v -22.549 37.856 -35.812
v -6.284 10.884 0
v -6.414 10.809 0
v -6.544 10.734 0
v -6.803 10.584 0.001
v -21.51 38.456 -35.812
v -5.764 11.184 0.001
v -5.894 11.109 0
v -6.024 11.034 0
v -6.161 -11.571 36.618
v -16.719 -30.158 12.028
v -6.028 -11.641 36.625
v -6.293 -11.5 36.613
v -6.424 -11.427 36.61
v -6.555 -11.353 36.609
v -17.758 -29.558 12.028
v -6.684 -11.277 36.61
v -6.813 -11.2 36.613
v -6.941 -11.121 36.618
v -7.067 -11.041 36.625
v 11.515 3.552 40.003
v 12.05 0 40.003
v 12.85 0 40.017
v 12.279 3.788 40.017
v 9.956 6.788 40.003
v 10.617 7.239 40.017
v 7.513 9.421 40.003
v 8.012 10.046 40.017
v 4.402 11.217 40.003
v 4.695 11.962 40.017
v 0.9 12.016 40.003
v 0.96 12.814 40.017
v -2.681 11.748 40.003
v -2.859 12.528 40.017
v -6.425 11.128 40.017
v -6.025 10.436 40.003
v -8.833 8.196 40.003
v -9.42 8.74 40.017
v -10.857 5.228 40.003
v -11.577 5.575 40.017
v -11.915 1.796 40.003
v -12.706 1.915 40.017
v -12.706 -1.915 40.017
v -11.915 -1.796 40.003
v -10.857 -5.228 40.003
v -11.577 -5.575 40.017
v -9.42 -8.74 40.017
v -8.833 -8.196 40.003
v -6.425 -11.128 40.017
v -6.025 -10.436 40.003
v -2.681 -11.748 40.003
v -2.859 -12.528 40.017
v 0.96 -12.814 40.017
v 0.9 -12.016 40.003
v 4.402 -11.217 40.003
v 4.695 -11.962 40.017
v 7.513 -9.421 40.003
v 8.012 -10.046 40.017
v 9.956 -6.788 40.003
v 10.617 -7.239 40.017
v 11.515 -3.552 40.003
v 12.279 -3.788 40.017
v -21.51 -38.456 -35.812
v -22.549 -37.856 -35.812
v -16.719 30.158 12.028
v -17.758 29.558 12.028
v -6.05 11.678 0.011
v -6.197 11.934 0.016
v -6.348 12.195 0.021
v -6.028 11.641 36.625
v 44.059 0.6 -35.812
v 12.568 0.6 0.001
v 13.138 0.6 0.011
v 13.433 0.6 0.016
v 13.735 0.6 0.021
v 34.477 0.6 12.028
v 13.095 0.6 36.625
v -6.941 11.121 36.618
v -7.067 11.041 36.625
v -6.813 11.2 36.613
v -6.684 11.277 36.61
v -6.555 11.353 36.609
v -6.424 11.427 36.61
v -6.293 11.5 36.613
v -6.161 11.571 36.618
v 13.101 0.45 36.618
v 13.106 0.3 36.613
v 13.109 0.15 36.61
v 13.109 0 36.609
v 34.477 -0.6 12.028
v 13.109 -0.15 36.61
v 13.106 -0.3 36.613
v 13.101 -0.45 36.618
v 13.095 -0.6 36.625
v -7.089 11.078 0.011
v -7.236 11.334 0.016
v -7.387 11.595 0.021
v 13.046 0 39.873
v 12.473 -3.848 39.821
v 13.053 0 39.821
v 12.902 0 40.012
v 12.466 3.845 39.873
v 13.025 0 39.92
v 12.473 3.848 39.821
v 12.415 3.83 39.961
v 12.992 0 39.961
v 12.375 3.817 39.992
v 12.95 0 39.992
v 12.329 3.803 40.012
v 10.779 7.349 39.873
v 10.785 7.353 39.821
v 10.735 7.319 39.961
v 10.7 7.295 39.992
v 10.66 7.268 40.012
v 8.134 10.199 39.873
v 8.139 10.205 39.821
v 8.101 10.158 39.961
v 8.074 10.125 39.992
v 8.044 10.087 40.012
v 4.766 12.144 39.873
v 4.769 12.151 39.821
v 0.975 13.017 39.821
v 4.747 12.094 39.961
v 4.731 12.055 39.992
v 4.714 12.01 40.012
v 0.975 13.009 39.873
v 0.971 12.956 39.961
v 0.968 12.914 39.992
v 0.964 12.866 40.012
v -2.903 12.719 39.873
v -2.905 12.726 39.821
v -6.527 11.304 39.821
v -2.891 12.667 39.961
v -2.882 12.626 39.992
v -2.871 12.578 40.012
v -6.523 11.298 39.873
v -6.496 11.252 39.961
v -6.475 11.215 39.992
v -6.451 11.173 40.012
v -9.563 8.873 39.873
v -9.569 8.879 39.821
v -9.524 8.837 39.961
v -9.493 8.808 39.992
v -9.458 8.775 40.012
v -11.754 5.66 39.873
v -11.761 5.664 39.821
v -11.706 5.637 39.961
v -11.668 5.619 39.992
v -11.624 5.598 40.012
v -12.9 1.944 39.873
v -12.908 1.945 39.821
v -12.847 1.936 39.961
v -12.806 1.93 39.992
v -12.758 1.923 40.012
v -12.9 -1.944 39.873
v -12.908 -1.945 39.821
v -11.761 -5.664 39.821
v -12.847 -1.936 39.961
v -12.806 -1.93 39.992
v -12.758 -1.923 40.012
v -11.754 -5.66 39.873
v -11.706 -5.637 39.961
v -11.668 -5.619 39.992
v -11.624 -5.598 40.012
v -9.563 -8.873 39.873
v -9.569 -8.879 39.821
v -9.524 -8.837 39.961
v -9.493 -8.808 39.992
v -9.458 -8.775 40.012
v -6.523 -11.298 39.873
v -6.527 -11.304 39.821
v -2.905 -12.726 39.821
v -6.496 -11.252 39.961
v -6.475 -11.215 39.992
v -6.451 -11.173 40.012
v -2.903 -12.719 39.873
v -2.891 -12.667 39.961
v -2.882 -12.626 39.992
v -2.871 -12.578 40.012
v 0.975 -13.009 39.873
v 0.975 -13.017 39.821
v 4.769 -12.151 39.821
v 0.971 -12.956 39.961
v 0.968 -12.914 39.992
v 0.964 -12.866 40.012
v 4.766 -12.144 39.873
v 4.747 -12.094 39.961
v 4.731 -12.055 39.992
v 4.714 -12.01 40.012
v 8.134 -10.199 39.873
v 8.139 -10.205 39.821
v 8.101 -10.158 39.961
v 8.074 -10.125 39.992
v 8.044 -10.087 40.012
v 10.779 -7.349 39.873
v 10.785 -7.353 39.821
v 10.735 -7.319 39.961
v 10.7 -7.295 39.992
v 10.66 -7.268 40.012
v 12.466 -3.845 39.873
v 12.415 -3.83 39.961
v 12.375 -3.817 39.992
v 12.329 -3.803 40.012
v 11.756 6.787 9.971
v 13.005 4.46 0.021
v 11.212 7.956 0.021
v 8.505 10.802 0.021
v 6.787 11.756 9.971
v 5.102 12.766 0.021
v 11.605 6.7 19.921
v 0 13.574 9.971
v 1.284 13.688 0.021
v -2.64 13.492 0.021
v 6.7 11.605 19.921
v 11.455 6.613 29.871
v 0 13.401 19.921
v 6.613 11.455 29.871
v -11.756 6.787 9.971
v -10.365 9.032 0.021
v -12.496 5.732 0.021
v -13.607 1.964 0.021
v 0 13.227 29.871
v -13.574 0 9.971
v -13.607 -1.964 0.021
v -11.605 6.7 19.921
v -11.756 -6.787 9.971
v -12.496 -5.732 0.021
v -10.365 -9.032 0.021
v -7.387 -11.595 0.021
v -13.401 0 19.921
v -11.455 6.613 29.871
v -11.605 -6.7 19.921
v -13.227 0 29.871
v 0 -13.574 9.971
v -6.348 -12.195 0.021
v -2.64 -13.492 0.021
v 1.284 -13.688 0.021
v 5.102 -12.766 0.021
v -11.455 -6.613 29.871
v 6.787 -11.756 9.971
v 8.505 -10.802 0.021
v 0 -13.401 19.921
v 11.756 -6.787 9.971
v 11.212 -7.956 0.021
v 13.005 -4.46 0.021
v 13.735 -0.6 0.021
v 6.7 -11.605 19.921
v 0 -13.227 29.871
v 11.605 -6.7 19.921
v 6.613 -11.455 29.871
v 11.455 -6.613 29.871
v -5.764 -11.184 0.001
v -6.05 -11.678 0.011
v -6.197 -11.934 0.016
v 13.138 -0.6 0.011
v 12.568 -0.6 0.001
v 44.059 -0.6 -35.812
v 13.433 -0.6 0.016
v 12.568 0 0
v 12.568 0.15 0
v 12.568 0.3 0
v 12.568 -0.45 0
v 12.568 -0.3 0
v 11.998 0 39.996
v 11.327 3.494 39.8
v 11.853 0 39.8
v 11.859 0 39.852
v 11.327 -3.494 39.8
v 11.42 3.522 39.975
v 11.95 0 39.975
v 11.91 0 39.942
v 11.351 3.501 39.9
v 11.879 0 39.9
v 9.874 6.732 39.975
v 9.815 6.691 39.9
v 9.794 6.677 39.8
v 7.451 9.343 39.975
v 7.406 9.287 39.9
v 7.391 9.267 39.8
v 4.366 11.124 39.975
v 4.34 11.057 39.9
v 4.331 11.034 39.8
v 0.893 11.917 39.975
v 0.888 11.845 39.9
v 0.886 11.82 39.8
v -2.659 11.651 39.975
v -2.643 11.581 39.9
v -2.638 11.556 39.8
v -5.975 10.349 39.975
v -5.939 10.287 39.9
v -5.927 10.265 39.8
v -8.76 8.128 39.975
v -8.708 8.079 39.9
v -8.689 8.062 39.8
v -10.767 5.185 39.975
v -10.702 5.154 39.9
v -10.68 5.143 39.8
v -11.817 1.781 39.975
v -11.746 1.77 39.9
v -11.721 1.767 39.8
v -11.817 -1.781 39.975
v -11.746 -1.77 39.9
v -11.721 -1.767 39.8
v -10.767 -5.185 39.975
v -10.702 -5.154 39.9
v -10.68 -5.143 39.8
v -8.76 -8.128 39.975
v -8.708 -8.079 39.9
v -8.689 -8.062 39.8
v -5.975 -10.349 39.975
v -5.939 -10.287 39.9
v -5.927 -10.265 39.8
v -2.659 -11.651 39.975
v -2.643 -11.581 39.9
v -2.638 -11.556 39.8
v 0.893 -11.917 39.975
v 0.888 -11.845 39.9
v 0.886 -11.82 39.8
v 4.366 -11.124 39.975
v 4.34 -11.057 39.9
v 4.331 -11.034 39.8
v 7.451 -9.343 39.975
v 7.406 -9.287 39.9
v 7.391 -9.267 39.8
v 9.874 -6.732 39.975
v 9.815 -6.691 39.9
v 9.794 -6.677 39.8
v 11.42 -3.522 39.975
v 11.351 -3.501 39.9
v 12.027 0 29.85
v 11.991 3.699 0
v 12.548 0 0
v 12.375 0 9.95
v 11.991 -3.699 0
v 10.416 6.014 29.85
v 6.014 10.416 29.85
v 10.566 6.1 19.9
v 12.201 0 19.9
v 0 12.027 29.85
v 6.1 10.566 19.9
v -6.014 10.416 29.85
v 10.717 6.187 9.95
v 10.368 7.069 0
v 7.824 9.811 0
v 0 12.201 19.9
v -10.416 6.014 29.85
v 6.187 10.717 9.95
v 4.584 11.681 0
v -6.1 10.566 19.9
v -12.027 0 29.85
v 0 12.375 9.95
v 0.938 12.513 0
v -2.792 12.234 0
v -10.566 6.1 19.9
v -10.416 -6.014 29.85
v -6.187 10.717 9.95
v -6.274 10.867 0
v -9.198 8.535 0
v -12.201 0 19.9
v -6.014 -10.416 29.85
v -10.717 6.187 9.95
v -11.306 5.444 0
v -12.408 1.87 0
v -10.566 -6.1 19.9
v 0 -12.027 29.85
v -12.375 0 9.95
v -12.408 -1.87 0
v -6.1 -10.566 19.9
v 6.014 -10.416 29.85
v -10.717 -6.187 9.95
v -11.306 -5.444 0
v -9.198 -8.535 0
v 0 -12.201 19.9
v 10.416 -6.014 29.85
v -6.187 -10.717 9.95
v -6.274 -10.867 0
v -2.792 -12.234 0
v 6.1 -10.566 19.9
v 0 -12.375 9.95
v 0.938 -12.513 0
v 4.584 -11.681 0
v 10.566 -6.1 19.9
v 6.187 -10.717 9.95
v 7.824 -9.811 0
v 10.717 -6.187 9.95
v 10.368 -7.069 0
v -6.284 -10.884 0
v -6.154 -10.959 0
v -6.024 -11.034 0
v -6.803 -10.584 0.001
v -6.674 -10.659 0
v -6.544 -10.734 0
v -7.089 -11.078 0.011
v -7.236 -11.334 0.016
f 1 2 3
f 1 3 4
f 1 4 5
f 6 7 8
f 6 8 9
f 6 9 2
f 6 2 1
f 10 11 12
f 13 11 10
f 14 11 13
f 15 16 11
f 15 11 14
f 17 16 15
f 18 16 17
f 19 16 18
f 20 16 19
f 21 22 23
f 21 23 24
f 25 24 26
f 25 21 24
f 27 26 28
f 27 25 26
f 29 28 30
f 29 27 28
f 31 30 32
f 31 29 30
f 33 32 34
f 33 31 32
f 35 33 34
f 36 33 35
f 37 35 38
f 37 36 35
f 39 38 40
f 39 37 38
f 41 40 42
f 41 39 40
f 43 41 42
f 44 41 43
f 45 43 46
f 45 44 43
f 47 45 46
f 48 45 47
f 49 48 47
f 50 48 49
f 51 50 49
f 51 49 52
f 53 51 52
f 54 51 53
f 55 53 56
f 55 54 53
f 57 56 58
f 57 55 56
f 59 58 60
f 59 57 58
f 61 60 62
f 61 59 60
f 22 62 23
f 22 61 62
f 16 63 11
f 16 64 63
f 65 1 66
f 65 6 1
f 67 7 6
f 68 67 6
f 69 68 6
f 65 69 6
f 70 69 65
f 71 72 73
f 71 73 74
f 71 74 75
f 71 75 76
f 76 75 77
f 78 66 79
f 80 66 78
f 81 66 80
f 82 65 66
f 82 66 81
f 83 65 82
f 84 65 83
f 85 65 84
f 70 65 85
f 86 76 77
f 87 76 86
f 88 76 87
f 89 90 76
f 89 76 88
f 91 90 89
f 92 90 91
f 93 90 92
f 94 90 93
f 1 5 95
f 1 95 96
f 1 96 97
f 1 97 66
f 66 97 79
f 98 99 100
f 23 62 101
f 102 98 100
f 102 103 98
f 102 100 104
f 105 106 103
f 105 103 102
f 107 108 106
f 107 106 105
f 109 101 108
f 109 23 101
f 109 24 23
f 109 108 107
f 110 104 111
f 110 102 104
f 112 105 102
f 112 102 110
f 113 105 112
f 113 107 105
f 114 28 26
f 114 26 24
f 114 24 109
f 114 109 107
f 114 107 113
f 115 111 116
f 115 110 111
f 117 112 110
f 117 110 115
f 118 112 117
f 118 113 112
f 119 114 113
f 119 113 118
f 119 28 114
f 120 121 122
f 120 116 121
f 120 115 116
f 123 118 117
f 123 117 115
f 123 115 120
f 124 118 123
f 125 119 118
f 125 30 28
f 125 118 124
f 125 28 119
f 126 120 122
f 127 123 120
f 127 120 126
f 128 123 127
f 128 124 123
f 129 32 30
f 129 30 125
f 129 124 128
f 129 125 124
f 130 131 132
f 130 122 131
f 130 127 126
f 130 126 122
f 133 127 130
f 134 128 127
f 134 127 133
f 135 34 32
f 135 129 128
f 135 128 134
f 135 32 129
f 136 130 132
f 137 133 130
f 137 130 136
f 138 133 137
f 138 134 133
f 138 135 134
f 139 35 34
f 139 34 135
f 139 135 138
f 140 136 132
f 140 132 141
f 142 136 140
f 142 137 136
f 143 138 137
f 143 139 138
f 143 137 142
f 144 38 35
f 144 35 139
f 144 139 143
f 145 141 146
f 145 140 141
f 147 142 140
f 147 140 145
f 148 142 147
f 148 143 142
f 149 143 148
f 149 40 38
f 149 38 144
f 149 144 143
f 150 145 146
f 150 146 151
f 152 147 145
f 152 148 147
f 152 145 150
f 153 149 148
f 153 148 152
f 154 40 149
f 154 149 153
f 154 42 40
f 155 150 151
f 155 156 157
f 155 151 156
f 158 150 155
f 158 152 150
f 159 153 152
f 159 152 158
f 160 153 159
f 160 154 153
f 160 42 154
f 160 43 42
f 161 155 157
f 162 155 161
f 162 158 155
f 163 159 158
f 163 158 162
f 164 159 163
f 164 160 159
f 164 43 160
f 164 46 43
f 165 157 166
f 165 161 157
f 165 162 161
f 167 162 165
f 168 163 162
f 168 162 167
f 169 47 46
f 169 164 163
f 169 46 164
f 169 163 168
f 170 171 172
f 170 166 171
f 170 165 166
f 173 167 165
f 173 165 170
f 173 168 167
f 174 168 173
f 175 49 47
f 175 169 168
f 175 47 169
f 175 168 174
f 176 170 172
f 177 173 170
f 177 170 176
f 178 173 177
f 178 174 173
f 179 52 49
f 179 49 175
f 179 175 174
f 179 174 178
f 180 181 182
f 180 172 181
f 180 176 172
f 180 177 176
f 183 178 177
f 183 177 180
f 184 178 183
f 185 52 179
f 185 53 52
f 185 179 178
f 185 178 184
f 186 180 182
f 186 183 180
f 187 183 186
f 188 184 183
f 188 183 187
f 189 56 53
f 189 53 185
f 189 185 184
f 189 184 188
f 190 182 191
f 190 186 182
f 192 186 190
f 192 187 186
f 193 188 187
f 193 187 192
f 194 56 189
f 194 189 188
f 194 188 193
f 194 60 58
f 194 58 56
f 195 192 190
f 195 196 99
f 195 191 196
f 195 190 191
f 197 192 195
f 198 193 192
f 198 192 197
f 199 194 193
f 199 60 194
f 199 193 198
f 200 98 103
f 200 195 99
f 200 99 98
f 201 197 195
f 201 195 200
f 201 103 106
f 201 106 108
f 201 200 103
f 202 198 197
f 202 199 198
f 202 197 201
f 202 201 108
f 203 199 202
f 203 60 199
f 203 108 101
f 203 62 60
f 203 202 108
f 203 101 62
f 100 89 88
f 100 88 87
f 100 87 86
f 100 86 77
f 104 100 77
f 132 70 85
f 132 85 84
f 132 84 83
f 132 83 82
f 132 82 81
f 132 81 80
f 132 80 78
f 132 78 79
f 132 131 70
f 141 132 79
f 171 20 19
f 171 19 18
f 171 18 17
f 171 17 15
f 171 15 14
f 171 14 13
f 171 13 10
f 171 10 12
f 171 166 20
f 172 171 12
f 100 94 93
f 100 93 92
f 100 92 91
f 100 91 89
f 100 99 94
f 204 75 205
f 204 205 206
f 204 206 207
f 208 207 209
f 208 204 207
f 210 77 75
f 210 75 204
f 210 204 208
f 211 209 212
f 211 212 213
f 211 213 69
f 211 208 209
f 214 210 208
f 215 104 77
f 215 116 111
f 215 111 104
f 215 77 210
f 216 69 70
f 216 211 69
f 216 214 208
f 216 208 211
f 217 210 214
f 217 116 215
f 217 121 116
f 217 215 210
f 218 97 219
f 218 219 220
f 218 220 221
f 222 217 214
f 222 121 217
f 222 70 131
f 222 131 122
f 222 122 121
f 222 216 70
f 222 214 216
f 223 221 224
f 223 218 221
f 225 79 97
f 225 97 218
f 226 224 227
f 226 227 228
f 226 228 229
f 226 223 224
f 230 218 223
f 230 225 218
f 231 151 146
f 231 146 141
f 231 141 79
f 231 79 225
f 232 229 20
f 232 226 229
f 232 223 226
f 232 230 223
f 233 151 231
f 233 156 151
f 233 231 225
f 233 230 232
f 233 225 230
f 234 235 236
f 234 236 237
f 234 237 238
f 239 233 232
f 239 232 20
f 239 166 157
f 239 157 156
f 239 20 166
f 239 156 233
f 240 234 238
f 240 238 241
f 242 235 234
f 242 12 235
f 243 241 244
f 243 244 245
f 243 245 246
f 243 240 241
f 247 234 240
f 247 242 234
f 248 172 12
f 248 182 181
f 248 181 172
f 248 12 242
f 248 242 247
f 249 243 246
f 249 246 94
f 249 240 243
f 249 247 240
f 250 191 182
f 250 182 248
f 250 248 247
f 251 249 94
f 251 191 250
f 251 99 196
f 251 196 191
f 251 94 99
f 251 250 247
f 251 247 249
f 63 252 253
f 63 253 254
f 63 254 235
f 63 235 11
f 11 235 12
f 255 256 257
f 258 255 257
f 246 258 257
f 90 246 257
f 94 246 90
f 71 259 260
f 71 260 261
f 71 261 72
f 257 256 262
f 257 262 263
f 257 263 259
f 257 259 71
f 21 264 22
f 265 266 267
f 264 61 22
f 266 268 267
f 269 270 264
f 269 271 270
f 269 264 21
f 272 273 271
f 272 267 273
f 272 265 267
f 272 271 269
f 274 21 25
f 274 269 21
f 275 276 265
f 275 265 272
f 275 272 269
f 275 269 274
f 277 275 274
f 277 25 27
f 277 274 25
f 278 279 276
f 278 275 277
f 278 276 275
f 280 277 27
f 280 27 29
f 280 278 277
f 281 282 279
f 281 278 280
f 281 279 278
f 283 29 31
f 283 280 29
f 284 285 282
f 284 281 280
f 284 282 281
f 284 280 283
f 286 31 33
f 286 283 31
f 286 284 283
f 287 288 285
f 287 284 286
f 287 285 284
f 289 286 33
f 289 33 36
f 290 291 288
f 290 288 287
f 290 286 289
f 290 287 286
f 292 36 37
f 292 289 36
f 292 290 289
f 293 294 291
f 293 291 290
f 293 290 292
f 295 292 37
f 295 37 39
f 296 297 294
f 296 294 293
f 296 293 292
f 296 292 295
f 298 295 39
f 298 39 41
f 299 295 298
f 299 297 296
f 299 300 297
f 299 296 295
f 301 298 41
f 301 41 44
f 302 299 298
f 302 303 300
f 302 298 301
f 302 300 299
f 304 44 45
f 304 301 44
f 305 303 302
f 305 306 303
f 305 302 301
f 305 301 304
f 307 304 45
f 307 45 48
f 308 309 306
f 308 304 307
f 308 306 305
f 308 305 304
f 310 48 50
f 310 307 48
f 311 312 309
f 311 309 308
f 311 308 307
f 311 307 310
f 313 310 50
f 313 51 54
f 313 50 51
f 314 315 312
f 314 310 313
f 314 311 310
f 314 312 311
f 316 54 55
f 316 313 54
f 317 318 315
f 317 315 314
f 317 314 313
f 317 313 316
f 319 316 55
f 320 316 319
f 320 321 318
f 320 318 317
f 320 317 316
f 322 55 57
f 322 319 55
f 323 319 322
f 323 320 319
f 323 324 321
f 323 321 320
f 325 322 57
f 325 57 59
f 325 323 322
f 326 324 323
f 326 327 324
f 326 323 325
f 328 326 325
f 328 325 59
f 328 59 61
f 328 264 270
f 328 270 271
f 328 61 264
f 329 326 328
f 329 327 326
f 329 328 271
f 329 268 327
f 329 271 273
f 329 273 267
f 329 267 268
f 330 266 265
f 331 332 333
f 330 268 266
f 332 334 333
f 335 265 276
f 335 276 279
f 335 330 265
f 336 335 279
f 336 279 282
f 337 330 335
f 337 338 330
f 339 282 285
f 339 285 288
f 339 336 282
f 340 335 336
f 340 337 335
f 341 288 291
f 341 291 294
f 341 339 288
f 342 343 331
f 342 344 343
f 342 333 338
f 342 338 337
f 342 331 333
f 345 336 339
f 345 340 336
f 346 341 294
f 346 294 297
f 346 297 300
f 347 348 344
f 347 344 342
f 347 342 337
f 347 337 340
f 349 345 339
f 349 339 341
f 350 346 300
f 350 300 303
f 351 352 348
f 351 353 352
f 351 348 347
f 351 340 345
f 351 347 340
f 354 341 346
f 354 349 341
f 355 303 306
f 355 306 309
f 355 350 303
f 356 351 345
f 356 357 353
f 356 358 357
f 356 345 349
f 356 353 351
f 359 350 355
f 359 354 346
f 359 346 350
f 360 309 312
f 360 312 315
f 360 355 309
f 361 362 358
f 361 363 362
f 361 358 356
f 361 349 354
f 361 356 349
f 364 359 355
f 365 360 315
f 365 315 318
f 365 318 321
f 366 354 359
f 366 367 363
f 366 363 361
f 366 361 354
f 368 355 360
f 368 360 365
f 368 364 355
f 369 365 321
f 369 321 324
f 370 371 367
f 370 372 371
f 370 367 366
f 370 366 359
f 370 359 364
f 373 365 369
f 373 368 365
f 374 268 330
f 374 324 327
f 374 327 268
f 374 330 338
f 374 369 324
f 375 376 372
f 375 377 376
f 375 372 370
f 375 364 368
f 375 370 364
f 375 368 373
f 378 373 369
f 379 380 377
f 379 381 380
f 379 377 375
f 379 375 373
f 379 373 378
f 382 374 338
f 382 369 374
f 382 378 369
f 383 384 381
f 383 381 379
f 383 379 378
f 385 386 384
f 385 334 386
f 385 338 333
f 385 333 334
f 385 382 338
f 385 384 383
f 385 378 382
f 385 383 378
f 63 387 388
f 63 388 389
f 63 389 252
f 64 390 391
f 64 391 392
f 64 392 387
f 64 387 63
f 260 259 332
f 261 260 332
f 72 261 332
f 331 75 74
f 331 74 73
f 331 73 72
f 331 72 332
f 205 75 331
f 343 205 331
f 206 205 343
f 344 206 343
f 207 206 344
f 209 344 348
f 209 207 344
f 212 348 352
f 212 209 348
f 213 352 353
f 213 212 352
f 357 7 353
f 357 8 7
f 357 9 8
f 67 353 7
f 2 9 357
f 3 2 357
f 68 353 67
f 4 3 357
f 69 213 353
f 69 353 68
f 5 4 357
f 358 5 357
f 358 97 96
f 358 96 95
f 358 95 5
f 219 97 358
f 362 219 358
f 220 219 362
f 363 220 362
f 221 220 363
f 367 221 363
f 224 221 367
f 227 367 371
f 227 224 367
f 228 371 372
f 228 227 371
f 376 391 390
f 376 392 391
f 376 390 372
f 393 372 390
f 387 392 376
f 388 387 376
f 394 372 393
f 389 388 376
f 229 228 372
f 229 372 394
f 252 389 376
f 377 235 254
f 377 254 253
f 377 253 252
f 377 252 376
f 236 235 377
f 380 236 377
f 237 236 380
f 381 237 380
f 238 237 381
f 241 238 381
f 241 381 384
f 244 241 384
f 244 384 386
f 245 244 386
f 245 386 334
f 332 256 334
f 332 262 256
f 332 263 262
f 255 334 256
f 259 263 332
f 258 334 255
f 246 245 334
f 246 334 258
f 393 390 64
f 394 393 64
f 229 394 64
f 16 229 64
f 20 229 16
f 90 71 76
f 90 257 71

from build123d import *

# Parameters (mm, degrees)
F4_DEPTH = 0.6
F5_COUNT = 3


with BuildPart() as f2:
    # F1 (on Front) → F2 (revolve)
    with BuildSketch(Plane.XZ):
        with BuildLine():
            ThreePointArc((12.049969539, 40.0034904813), (11.9095920603, 39.9424526163), (11.8534904813, 39.800030461))
            Line((11.8534904813, 39.800030461), (12.5482025971, 0))
            Line((12.5482025971, 0), (13.7480198313, 0.0209428877))
            Line((13.7480198313, 0.0209428877), (13.0533077155, 39.8209733487))
            ThreePointArc((13.0533077155, 39.8209733487), (12.9922698505, 39.9613508275), (12.8498476952, 40.0174524064))
            Line((12.8498476952, 40.0174524064), (12.049969539, 40.0034904813))
        make_face()
    revolve(axis=Axis((0, 0, 20), (0, 0, 1)))

    # F3 (on Front) → F4 (join, symmetric)
    with BuildSketch(Plane.XZ):
        Polygon((34.4769248011, 12.0279620331), (11.884605497, 38.0174524064), (12.5477969416, 0.0232399905), (44.0591547085, -35.8122301865), align=None)
    extrude(amount=F4_DEPTH, both=True)

    # F5: F2 ×3 about axis
    f5_axis = Axis((0, 0, 20), (0, 0, 1))


with BuildPart() as f2_1:
    add(f2.part)
    for i in range(1, F5_COUNT):
        add(f2.part.rotate(f5_axis, i * 360 / F5_COUNT))


solid = f2_1.part
